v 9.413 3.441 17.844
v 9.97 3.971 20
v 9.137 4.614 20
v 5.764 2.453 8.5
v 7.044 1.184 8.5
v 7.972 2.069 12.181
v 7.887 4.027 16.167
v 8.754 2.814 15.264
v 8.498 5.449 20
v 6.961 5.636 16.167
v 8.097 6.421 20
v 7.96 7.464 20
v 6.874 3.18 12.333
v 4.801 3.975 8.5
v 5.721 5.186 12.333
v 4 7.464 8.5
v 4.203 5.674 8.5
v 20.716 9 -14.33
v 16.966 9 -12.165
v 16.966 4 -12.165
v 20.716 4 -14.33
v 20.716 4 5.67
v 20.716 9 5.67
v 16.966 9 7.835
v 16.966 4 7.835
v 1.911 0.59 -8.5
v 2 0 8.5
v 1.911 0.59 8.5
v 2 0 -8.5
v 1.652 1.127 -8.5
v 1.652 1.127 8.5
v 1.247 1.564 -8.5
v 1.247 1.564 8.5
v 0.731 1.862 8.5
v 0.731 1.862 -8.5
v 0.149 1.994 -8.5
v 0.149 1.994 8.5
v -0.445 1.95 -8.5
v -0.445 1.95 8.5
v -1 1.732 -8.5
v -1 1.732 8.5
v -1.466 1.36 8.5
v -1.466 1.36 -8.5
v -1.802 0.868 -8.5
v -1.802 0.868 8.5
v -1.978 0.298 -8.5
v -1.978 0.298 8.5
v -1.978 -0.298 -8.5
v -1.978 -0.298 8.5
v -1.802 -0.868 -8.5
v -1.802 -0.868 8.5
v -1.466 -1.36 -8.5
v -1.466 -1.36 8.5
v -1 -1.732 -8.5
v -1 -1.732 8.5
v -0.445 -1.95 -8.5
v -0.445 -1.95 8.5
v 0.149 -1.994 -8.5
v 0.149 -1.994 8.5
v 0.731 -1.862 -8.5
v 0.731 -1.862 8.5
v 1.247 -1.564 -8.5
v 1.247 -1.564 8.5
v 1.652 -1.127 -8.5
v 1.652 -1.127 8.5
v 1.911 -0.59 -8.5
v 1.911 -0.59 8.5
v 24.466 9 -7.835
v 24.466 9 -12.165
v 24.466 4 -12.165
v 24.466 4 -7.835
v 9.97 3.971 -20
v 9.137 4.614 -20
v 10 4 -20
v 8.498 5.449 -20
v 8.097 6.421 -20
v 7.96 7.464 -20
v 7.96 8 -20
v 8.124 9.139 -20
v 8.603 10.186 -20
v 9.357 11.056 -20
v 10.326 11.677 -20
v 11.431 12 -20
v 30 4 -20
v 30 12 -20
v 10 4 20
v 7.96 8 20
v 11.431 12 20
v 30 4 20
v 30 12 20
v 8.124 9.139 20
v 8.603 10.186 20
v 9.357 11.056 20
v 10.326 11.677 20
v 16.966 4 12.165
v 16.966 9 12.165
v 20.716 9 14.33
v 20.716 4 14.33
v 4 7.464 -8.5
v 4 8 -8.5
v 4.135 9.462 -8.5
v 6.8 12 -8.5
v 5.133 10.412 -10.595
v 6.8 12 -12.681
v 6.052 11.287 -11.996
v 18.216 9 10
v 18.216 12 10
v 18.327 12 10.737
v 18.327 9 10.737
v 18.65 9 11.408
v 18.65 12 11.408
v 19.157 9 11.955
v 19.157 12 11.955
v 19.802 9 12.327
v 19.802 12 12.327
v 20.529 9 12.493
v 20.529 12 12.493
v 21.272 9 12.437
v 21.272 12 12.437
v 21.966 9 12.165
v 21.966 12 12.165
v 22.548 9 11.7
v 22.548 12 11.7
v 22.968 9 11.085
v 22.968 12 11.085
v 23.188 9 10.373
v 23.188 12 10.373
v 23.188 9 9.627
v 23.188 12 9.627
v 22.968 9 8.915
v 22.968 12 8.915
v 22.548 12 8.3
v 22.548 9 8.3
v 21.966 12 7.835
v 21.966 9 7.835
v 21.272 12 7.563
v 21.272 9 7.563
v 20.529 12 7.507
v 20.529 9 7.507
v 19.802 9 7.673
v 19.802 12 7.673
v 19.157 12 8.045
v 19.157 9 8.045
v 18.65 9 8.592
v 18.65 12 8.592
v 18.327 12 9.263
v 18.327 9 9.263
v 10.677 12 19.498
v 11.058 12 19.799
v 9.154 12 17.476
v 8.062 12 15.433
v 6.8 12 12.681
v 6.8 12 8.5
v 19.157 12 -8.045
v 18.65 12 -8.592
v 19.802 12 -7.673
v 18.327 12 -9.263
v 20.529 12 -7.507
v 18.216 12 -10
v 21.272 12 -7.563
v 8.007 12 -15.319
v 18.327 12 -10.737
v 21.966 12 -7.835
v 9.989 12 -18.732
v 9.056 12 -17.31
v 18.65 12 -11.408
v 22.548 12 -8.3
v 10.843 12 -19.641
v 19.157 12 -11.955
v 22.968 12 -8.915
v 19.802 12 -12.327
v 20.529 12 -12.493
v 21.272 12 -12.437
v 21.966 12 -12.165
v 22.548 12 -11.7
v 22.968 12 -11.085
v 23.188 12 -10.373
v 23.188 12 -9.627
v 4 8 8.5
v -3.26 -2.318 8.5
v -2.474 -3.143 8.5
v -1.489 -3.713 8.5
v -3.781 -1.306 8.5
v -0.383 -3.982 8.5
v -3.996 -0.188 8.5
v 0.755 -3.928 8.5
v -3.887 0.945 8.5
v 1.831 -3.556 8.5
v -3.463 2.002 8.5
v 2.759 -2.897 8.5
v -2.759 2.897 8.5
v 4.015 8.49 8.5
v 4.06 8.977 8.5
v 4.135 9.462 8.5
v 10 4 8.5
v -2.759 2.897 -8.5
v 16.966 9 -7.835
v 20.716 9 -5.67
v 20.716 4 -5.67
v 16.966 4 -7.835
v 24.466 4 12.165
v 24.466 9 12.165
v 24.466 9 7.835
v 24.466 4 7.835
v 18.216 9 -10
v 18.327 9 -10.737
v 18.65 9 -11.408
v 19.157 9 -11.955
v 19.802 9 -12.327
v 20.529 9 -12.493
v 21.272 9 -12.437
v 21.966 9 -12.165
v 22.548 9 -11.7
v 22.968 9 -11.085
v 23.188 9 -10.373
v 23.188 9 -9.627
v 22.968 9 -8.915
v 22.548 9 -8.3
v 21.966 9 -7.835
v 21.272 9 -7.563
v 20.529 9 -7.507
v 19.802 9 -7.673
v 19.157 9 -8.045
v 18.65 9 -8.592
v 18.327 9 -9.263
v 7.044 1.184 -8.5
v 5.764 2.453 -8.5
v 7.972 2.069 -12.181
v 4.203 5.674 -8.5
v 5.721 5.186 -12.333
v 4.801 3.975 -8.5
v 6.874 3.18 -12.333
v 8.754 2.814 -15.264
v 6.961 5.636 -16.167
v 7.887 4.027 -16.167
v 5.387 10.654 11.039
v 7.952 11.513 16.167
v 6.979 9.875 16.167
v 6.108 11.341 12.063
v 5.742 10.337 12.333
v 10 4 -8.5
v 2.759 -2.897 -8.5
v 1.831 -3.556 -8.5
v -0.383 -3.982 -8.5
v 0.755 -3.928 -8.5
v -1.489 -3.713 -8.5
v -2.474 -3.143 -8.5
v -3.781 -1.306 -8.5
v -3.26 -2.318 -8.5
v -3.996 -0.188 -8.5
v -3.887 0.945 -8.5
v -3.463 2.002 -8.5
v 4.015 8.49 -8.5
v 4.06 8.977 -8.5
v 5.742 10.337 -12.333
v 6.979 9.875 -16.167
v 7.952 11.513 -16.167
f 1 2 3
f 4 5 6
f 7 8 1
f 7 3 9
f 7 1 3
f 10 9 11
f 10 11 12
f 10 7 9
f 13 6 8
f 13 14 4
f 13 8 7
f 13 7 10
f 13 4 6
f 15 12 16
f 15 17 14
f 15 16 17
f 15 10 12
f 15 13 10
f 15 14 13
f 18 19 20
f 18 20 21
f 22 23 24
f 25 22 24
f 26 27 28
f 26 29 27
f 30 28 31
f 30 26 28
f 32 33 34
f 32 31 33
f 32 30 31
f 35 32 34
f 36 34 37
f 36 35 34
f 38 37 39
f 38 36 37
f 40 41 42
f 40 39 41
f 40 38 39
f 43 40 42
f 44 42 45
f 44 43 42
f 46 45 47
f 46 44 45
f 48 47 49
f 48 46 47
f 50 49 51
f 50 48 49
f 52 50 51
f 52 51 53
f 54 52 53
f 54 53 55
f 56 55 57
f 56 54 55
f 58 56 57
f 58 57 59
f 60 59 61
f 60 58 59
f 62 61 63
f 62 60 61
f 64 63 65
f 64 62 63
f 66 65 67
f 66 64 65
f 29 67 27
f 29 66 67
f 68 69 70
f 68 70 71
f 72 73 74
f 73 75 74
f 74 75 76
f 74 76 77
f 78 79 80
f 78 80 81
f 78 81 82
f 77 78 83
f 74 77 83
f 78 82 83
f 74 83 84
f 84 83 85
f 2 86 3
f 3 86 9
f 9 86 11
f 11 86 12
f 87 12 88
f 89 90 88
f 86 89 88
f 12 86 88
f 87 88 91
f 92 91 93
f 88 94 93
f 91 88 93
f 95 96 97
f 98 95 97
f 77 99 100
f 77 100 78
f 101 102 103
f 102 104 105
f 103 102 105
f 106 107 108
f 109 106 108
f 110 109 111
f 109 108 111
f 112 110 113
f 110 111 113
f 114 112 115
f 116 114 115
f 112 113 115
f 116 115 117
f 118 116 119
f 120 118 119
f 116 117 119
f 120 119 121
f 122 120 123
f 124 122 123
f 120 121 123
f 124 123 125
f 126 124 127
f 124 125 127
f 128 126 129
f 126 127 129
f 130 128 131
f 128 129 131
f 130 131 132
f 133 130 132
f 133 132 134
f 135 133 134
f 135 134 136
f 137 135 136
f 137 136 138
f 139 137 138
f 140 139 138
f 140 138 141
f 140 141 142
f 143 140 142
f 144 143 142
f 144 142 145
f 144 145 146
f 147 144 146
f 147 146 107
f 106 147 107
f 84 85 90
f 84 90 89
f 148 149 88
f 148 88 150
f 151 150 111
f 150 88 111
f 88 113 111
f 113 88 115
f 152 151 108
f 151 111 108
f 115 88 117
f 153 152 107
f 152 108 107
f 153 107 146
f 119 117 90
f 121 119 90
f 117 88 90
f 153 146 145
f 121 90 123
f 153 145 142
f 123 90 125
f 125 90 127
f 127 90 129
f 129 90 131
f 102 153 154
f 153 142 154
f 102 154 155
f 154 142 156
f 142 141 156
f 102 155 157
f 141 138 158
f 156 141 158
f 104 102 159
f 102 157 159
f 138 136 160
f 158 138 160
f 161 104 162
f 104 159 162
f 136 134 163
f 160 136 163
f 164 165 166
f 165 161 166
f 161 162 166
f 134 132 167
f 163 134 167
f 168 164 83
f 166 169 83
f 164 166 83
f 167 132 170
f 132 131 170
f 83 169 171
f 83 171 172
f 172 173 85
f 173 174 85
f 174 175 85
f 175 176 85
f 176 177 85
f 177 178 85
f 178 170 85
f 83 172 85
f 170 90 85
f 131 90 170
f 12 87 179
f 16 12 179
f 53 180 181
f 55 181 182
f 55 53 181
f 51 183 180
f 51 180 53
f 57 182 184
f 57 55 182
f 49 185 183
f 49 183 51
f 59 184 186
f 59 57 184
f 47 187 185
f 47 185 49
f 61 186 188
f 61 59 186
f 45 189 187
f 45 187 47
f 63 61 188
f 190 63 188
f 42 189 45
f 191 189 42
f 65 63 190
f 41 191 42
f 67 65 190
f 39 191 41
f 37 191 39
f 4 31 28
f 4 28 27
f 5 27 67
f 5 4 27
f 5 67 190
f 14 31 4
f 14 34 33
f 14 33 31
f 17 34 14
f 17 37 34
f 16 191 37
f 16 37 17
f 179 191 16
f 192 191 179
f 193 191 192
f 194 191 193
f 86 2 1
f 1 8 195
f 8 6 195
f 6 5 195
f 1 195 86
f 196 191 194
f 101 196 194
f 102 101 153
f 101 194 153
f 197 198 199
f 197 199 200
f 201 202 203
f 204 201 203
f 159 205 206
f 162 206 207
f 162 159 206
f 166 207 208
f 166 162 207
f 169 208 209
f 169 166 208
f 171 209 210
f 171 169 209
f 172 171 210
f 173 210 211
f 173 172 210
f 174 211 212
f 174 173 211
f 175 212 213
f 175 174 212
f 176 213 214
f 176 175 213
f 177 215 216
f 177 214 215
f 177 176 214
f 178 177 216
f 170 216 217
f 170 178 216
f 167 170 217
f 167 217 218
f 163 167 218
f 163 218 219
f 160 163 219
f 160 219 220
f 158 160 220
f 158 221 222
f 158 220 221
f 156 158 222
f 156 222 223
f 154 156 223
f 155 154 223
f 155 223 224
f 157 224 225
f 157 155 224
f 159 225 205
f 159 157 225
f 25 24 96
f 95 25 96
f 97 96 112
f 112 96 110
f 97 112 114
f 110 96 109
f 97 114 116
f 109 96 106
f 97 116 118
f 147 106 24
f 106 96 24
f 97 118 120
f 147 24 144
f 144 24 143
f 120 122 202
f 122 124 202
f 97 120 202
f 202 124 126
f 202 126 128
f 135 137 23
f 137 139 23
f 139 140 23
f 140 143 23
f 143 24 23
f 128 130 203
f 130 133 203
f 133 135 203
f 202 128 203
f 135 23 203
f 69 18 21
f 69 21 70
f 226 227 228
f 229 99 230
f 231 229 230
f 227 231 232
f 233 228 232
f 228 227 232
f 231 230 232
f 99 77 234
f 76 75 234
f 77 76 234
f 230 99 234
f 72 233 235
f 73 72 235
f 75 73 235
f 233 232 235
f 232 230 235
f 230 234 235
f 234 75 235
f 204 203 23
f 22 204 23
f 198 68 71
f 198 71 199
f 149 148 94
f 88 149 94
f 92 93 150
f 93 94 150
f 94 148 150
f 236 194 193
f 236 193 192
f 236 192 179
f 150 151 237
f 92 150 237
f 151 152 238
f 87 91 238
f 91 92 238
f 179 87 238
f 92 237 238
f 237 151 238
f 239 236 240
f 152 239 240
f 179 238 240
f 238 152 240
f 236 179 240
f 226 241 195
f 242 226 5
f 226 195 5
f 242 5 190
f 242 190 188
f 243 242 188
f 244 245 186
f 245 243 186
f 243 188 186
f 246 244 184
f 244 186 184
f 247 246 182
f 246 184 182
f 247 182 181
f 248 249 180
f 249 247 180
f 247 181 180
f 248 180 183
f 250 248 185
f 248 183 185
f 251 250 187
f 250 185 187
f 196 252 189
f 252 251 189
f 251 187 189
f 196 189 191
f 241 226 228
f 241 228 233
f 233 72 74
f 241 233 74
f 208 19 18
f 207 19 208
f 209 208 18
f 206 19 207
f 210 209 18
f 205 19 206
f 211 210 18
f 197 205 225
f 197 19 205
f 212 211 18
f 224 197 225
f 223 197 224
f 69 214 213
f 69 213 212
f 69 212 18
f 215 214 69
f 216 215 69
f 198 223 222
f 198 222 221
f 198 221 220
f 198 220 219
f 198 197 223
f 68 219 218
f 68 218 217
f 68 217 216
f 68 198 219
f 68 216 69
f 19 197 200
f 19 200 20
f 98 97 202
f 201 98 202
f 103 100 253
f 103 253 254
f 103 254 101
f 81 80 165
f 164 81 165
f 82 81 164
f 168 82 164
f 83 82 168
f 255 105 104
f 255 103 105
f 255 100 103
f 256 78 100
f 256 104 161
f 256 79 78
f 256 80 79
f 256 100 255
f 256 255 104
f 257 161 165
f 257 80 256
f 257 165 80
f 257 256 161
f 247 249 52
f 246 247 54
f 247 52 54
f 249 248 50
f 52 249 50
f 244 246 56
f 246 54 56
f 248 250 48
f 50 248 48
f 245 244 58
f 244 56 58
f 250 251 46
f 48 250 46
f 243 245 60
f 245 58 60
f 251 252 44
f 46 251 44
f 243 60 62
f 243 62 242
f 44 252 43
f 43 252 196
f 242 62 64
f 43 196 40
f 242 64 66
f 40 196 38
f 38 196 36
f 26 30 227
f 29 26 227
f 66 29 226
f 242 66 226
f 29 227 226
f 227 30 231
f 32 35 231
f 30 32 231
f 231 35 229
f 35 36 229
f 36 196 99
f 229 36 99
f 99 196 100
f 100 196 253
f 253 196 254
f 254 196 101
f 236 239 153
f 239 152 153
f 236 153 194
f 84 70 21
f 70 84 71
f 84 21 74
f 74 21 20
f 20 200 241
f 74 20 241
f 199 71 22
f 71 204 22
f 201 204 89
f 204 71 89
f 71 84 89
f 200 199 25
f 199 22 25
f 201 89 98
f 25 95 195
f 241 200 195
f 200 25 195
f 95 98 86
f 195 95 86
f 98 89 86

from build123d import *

# Parameters (mm, degrees)
SKETCH1_R               = 2
BOSS_EXTRUDE1_DEPTH     = 20
CUT_EXTRUDE1_DEPTH      = 37.932370625
CUT_EXTRUDE1_DEPTH_BACK = 37.932370625
SKETCH2_W               = 20
SKETCH2_H               = 16.5
FILLET1_R               = 4
CHAMFER1_SIZE           = 4
CHAMFER1_SIZE_2         = 11.616843511
SKETCH4_R               = 2.5
CUT_EXTRUDE2_DEPTH      = 40.446165847
CUT_EXTRUDE3_START      = -3
CUT_EXTRUDE3_DEPTH      = 37.446165847


with BuildPart() as part:
    # Sketch1 → Boss-Extrude1 (new, symmetric)
    with BuildSketch(Plane.XY):
        with BuildLine():
            Line((-2.75862069, 2.896551724), (6.8, 12))
            Line((6.8, 12), (30, 12))
            Line((30, 12), (30, 4))
            Line((30, 4), (10, 4))
            Line((10, 4), (2.75862069, -2.896551724))
            ThreePointArc((2.75862069, -2.896551724), (-2.896551724, -2.75862069), (-2.75862069, 2.896551724))
        make_face()
        Circle(SKETCH1_R, mode=Mode.SUBTRACT)
    extrude(amount=BOSS_EXTRUDE1_DEPTH, both=True)

    # Sketch2 → Cut-Extrude1 (cut, two sides: drawn at the far end of the back side and taken through both)
    with BuildSketch(Plane.XZ.offset(-4).offset(-CUT_EXTRUDE1_DEPTH_BACK)):
        with Locations((-2, 16.75)):
            Rectangle(SKETCH2_W, SKETCH2_H)
        with Locations((-2, -16.75)):
            Rectangle(SKETCH2_W, SKETCH2_H)
    extrude(amount=CUT_EXTRUDE1_DEPTH + CUT_EXTRUDE1_DEPTH_BACK, mode=Mode.SUBTRACT)

    # Fillet1
    # the kernel refuses this fillet: 4 mm, written as the material it takes off along each edge
    with BuildSketch(Plane(origin=(8, 2.095238095, -33.4221588), x_dir=(0.7241379310344825, 0.6896551724137934, 0), z_dir=(0, 0, 1))) as fillet1_piece_1:
        with BuildLine():
            CenterArc((6.599216221, 1.129177032), FILLET1_R, 136.397181027, 60)
            Line((3.702664496, 3.887797721), (3.644733462, 3.942970135))
            Line((3.644733462, 3.942970135), (-0.057931034, 0.055172414))
            Line((-0.057931034, 0.055172414), (0, -0.08))
            ThreePointArc((0, -0.08), (1.380952381, -0.08), (2.685158533, -0.022583541))
            Line((2.685158533, -0.022583541), (2.761904762, 0))
        make_face()
    extrude(amount=24.9221588, mode=Mode.SUBTRACT)
    with BuildSketch(Plane(origin=(8, 12, -8.5), x_dir=(0, -1, 0), z_dir=(0, 0, -1))) as fillet1_piece_2:
        with BuildLine():
            CenterArc((FILLET1_R, -FILLET1_R), FILLET1_R, 90, 90)
            Line((0, -FILLET1_R), (-FILLET1_R * 0.02, -FILLET1_R))
            Line((-FILLET1_R * 0.02, -FILLET1_R), (-FILLET1_R * 0.02, FILLET1_R * 0.02))
            Line((-FILLET1_R * 0.02, FILLET1_R * 0.02), (FILLET1_R, FILLET1_R * 0.02))
            Line((FILLET1_R, FILLET1_R * 0.02), (FILLET1_R, 0))
        make_face()
    extrude(amount=21.5, mode=Mode.SUBTRACT)
    with BuildSketch(Plane(origin=(8, 12, 8.5), x_dir=(0, -1, 0), z_dir=(0, 0, 1))) as fillet1_piece_3:
        with BuildLine():
            CenterArc((FILLET1_R, FILLET1_R), FILLET1_R, 180, 90)
            Line((0, FILLET1_R), (-FILLET1_R * 0.02, FILLET1_R))
            Line((-FILLET1_R * 0.02, FILLET1_R), (-FILLET1_R * 0.02, -FILLET1_R * 0.02))
            Line((-FILLET1_R * 0.02, -FILLET1_R * 0.02), (FILLET1_R, -FILLET1_R * 0.02))
            Line((FILLET1_R, -FILLET1_R * 0.02), (FILLET1_R, 0))
        make_face()
    extrude(amount=21.5, mode=Mode.SUBTRACT)
    with BuildSketch(Plane(origin=(8, 2.095238095, 33.4221588), x_dir=(0.7241379310344824, 0.6896551724137936, 0), z_dir=(0, 0, -1))) as fillet1_piece_4:
        with BuildLine():
            CenterArc((6.599216221, -1.129177032), FILLET1_R, 163.602818973, 60)
            Line((3.702664496, -3.887797721), (3.644733462, -3.942970135))
            Line((3.644733462, -3.942970135), (-0.057931034, -0.055172414))
            Line((-0.057931034, -0.055172414), (0, 0.08))
            ThreePointArc((0, 0.08), (1.380952381, 0.08), (2.685158533, 0.022583541))
            Line((2.685158533, 0.022583541), (2.761904762, 0))
        make_face()
    extrude(amount=24.9221588, mode=Mode.SUBTRACT)

    # Chamfer1
    # the kernel refuses this chamfer: 11.616843511, 4 mm, written as the material it adds along each edge
    with BuildSketch(Plane(origin=(12, 8, -8.5), x_dir=(-1, 0, 0), z_dir=(0, -1, 0))) as chamfer1_piece_1_section:
        Polygon((4 + CHAMFER1_SIZE, 0), (4, CHAMFER1_SIZE_2), (4, 0), align=None)
    chamfer1_piece_1 = revolve(axis=Axis((12, 8, -8.5), (0, 0, -1)), revolution_arc=359.64, mode=Mode.PRIVATE)
    chamfer1_piece_1 = split(chamfer1_piece_1, bisect_by=Plane(origin=(6.815559228, 9.673675178, -20), z_dir=(0, 0, 1)), keep=Keep.TOP, mode=Mode.PRIVATE)
    chamfer1_piece_1 = split(chamfer1_piece_1, bisect_by=Plane(origin=(6.815559228, 12, -12.048091189), z_dir=(0, -1, 0)), keep=Keep.TOP, mode=Mode.PRIVATE)
    chamfer1_piece_1 = split(chamfer1_piece_1, bisect_by=Plane(origin=(5.646379541, 10.901313849, -12.048091189), z_dir=(0.6896551724137935, -0.7241379310344824, 0)), keep=Keep.TOP, mode=Mode.PRIVATE)
    chamfer1_piece_1 = split(chamfer1_piece_1, bisect_by=Plane(origin=(11.163620921, 5.1082104, -12.048091189), z_dir=(-0.6896551724137935, 0.7241379310344825, 0)), keep=Keep.TOP, mode=Mode.PRIVATE)
    add(chamfer1_piece_1)
    with BuildSketch(Plane(origin=(8, 7.464101615, -8.5), x_dir=(-0.9944459243087849, 0, 0.10524877018591122), z_dir=(0, 1, 0))) as chamfer1_piece_2_section:
        Polygon((CHAMFER1_SIZE * 0.994445924309, -CHAMFER1_SIZE * 0.105248770186), (-CHAMFER1_SIZE_2 * 0.105248770183, -CHAMFER1_SIZE_2 * 0.994445924283), (0, 0), align=None)
    chamfer1_piece_2 = extrude(amount=0.535898385, mode=Mode.PRIVATE)
    chamfer1_piece_2 = split(chamfer1_piece_2, bisect_by=Plane(origin=(6.666533122, 7.732050808, -20), z_dir=(0, 0, 1)), keep=Keep.TOP, mode=Mode.PRIVATE)
    add(chamfer1_piece_2)
    with BuildSketch(Plane(origin=(12, 7.464101615, -8.5), x_dir=(-1, 0, 0), z_dir=(0, 1, 0))) as chamfer1_piece_3_section:
        Polygon((4 + CHAMFER1_SIZE, 0), (4, -CHAMFER1_SIZE_2), (4, 0), align=None)
    chamfer1_piece_3 = revolve(axis=Axis((12, 7.464101615, -8.5), (0, 0, 1)), revolution_arc=359.64, mode=Mode.PRIVATE)
    chamfer1_piece_3 = split(chamfer1_piece_3, bisect_by=Plane(origin=(6.73533338, 5.888138527, -20), z_dir=(0, 0, 1)), keep=Keep.TOP, mode=Mode.PRIVATE)
    chamfer1_piece_3 = split(chamfer1_piece_3, bisect_by=Plane(origin=(6.73533338, 12, -12.010330429), z_dir=(0, -1, 0)), keep=Keep.TOP, mode=Mode.PRIVATE)
    chamfer1_piece_3 = split(chamfer1_piece_3, bisect_by=Plane(origin=(3.713793343, 9.060755565, -12.010330429), z_dir=(0.6896551724137935, -0.7241379310344824, 0)), keep=Keep.TOP, mode=Mode.PRIVATE)
    chamfer1_piece_3 = split(chamfer1_piece_3, bisect_by=Plane(origin=(9.231034723, 3.267652117, -12.010330429), z_dir=(-0.6896551724137935, 0.7241379310344825, 0)), keep=Keep.TOP, mode=Mode.PRIVATE)
    add(chamfer1_piece_3)
    with BuildSketch(Plane(origin=(12, 8, 8.5), x_dir=(-0.9999802608561372, -0.006283143965558626, 0), z_dir=(-0.006283143965558626, 0.9999802608561372, 0))) as chamfer1_piece_4_section:
        Polygon((-4, CHAMFER1_SIZE_2), (-4 - CHAMFER1_SIZE, 0), (-4, 0), align=None)
    chamfer1_piece_4 = revolve(axis=Axis((12, 8, 8.5), (0, 0, 1)), revolution_arc=359.64, mode=Mode.PRIVATE)
    chamfer1_piece_4 = split(chamfer1_piece_4, bisect_by=Plane(origin=(8.929227056, 11.070772944, 20), z_dir=(0, 0, -1)), keep=Keep.TOP, mode=Mode.PRIVATE)
    chamfer1_piece_4 = split(chamfer1_piece_4, bisect_by=Plane(origin=(8.929227056, 12, 13.636607489), z_dir=(0, -1, 0)), keep=Keep.TOP, mode=Mode.PRIVATE)
    chamfer1_piece_4 = split(chamfer1_piece_4, bisect_by=Plane(origin=(7.452453946, 12.62138471, 13.636607489), z_dir=(0.6896551724137935, -0.7241379310344824, 0)), keep=Keep.TOP, mode=Mode.PRIVATE)
    chamfer1_piece_4 = split(chamfer1_piece_4, bisect_by=Plane(origin=(12.969695325, 6.828281262, 13.636607489), z_dir=(-0.6896551724137935, 0.7241379310344825, 0)), keep=Keep.TOP, mode=Mode.PRIVATE)
    add(chamfer1_piece_4)
    with BuildSketch(Plane(origin=(8, 8, 8.5), x_dir=(0.012547158200392034, 0, 0.9999212813122313), z_dir=(0, -1, 0))) as chamfer1_piece_5_section:
        Polygon((CHAMFER1_SIZE_2 * 0.999921281287, CHAMFER1_SIZE_2 * 0.0125471582001), (-CHAMFER1_SIZE * 0.0125471582004, CHAMFER1_SIZE * 0.999921281312), (0, 0), align=None)
    chamfer1_piece_5 = extrude(amount=0.535898385, mode=Mode.PRIVATE)
    chamfer1_piece_5 = split(chamfer1_piece_5, bisect_by=Plane(origin=(6.666533122, 7.732050808, 20), z_dir=(0, 0, -1)), keep=Keep.TOP, mode=Mode.PRIVATE)
    add(chamfer1_piece_5)
    with BuildSketch(Plane(origin=(12, 7.464101615, 8.5), x_dir=(-0.9999802608561402, 0.006283143965082117, 0), z_dir=(-0.006283143965082117, -0.9999802608561402, 0))) as chamfer1_piece_6_section:
        Polygon((-4, -CHAMFER1_SIZE_2), (-4 - CHAMFER1_SIZE, 0), (-4, 0), align=None)
    chamfer1_piece_6 = revolve(axis=Axis((12, 7.464101615, 8.5), (0, 0, -1)), revolution_arc=359.64, mode=Mode.PRIVATE)
    chamfer1_piece_6 = split(chamfer1_piece_6, bisect_by=Plane(origin=(8.748719475, 3.446621368, 20), z_dir=(0, 0, -1)), keep=Keep.TOP, mode=Mode.PRIVATE)
    chamfer1_piece_6 = split(chamfer1_piece_6, bisect_by=Plane(origin=(8.748719475, 12, 12.595227268), z_dir=(0, -1, 0)), keep=Keep.TOP, mode=Mode.PRIVATE)
    chamfer1_piece_6 = split(chamfer1_piece_6, bisect_by=Plane(origin=(3.55025715, 8.905006809, 12.595227268), z_dir=(0.6896551724137935, -0.7241379310344824, 0)), keep=Keep.TOP, mode=Mode.PRIVATE)
    chamfer1_piece_6 = split(chamfer1_piece_6, bisect_by=Plane(origin=(9.067498529, 3.111903361, 12.595227268), z_dir=(-0.6896551724137935, 0.7241379310344825, 0)), keep=Keep.TOP, mode=Mode.PRIVATE)
    add(chamfer1_piece_6)

    # Sketch4 → Cut-Extrude2 (cut, through all)
    with BuildSketch(Plane(origin=(0, 12, 0), x_dir=(1, 0, 0), z_dir=(0, 1, 0))):
        with Locations(Location((20.715624268, -10, 0), (0, 0, 180))):
            Circle(SKETCH4_R)
    cut_extrude2 = extrude(amount=-CUT_EXTRUDE2_DEPTH, mode=Mode.SUBTRACT)

    # Sketch5 → Cut-Extrude3 (cut, through all)
    with BuildSketch(Plane(origin=(0, 12, 0), x_dir=(1, 0, 0), z_dir=(0, 1, 0)).offset(CUT_EXTRUDE3_START)):
        Polygon((20.715624268, -14.330127019), (24.465624268, -12.165063509), (24.465624268, -7.834936491), (20.715624268, -5.669872981), (16.965624268, -7.834936491), (16.965624268, -12.165063509), align=None)
    cut_extrude3 = extrude(amount=-CUT_EXTRUDE3_DEPTH, mode=Mode.SUBTRACT)

    # Mirror1: Cut-Extrude2, Cut-Extrude3 across plane
    add(cut_extrude2.mirror(Plane.XY), mode=Mode.SUBTRACT)
    add(cut_extrude3.mirror(Plane.XY), mode=Mode.SUBTRACT)


solid = part.part
